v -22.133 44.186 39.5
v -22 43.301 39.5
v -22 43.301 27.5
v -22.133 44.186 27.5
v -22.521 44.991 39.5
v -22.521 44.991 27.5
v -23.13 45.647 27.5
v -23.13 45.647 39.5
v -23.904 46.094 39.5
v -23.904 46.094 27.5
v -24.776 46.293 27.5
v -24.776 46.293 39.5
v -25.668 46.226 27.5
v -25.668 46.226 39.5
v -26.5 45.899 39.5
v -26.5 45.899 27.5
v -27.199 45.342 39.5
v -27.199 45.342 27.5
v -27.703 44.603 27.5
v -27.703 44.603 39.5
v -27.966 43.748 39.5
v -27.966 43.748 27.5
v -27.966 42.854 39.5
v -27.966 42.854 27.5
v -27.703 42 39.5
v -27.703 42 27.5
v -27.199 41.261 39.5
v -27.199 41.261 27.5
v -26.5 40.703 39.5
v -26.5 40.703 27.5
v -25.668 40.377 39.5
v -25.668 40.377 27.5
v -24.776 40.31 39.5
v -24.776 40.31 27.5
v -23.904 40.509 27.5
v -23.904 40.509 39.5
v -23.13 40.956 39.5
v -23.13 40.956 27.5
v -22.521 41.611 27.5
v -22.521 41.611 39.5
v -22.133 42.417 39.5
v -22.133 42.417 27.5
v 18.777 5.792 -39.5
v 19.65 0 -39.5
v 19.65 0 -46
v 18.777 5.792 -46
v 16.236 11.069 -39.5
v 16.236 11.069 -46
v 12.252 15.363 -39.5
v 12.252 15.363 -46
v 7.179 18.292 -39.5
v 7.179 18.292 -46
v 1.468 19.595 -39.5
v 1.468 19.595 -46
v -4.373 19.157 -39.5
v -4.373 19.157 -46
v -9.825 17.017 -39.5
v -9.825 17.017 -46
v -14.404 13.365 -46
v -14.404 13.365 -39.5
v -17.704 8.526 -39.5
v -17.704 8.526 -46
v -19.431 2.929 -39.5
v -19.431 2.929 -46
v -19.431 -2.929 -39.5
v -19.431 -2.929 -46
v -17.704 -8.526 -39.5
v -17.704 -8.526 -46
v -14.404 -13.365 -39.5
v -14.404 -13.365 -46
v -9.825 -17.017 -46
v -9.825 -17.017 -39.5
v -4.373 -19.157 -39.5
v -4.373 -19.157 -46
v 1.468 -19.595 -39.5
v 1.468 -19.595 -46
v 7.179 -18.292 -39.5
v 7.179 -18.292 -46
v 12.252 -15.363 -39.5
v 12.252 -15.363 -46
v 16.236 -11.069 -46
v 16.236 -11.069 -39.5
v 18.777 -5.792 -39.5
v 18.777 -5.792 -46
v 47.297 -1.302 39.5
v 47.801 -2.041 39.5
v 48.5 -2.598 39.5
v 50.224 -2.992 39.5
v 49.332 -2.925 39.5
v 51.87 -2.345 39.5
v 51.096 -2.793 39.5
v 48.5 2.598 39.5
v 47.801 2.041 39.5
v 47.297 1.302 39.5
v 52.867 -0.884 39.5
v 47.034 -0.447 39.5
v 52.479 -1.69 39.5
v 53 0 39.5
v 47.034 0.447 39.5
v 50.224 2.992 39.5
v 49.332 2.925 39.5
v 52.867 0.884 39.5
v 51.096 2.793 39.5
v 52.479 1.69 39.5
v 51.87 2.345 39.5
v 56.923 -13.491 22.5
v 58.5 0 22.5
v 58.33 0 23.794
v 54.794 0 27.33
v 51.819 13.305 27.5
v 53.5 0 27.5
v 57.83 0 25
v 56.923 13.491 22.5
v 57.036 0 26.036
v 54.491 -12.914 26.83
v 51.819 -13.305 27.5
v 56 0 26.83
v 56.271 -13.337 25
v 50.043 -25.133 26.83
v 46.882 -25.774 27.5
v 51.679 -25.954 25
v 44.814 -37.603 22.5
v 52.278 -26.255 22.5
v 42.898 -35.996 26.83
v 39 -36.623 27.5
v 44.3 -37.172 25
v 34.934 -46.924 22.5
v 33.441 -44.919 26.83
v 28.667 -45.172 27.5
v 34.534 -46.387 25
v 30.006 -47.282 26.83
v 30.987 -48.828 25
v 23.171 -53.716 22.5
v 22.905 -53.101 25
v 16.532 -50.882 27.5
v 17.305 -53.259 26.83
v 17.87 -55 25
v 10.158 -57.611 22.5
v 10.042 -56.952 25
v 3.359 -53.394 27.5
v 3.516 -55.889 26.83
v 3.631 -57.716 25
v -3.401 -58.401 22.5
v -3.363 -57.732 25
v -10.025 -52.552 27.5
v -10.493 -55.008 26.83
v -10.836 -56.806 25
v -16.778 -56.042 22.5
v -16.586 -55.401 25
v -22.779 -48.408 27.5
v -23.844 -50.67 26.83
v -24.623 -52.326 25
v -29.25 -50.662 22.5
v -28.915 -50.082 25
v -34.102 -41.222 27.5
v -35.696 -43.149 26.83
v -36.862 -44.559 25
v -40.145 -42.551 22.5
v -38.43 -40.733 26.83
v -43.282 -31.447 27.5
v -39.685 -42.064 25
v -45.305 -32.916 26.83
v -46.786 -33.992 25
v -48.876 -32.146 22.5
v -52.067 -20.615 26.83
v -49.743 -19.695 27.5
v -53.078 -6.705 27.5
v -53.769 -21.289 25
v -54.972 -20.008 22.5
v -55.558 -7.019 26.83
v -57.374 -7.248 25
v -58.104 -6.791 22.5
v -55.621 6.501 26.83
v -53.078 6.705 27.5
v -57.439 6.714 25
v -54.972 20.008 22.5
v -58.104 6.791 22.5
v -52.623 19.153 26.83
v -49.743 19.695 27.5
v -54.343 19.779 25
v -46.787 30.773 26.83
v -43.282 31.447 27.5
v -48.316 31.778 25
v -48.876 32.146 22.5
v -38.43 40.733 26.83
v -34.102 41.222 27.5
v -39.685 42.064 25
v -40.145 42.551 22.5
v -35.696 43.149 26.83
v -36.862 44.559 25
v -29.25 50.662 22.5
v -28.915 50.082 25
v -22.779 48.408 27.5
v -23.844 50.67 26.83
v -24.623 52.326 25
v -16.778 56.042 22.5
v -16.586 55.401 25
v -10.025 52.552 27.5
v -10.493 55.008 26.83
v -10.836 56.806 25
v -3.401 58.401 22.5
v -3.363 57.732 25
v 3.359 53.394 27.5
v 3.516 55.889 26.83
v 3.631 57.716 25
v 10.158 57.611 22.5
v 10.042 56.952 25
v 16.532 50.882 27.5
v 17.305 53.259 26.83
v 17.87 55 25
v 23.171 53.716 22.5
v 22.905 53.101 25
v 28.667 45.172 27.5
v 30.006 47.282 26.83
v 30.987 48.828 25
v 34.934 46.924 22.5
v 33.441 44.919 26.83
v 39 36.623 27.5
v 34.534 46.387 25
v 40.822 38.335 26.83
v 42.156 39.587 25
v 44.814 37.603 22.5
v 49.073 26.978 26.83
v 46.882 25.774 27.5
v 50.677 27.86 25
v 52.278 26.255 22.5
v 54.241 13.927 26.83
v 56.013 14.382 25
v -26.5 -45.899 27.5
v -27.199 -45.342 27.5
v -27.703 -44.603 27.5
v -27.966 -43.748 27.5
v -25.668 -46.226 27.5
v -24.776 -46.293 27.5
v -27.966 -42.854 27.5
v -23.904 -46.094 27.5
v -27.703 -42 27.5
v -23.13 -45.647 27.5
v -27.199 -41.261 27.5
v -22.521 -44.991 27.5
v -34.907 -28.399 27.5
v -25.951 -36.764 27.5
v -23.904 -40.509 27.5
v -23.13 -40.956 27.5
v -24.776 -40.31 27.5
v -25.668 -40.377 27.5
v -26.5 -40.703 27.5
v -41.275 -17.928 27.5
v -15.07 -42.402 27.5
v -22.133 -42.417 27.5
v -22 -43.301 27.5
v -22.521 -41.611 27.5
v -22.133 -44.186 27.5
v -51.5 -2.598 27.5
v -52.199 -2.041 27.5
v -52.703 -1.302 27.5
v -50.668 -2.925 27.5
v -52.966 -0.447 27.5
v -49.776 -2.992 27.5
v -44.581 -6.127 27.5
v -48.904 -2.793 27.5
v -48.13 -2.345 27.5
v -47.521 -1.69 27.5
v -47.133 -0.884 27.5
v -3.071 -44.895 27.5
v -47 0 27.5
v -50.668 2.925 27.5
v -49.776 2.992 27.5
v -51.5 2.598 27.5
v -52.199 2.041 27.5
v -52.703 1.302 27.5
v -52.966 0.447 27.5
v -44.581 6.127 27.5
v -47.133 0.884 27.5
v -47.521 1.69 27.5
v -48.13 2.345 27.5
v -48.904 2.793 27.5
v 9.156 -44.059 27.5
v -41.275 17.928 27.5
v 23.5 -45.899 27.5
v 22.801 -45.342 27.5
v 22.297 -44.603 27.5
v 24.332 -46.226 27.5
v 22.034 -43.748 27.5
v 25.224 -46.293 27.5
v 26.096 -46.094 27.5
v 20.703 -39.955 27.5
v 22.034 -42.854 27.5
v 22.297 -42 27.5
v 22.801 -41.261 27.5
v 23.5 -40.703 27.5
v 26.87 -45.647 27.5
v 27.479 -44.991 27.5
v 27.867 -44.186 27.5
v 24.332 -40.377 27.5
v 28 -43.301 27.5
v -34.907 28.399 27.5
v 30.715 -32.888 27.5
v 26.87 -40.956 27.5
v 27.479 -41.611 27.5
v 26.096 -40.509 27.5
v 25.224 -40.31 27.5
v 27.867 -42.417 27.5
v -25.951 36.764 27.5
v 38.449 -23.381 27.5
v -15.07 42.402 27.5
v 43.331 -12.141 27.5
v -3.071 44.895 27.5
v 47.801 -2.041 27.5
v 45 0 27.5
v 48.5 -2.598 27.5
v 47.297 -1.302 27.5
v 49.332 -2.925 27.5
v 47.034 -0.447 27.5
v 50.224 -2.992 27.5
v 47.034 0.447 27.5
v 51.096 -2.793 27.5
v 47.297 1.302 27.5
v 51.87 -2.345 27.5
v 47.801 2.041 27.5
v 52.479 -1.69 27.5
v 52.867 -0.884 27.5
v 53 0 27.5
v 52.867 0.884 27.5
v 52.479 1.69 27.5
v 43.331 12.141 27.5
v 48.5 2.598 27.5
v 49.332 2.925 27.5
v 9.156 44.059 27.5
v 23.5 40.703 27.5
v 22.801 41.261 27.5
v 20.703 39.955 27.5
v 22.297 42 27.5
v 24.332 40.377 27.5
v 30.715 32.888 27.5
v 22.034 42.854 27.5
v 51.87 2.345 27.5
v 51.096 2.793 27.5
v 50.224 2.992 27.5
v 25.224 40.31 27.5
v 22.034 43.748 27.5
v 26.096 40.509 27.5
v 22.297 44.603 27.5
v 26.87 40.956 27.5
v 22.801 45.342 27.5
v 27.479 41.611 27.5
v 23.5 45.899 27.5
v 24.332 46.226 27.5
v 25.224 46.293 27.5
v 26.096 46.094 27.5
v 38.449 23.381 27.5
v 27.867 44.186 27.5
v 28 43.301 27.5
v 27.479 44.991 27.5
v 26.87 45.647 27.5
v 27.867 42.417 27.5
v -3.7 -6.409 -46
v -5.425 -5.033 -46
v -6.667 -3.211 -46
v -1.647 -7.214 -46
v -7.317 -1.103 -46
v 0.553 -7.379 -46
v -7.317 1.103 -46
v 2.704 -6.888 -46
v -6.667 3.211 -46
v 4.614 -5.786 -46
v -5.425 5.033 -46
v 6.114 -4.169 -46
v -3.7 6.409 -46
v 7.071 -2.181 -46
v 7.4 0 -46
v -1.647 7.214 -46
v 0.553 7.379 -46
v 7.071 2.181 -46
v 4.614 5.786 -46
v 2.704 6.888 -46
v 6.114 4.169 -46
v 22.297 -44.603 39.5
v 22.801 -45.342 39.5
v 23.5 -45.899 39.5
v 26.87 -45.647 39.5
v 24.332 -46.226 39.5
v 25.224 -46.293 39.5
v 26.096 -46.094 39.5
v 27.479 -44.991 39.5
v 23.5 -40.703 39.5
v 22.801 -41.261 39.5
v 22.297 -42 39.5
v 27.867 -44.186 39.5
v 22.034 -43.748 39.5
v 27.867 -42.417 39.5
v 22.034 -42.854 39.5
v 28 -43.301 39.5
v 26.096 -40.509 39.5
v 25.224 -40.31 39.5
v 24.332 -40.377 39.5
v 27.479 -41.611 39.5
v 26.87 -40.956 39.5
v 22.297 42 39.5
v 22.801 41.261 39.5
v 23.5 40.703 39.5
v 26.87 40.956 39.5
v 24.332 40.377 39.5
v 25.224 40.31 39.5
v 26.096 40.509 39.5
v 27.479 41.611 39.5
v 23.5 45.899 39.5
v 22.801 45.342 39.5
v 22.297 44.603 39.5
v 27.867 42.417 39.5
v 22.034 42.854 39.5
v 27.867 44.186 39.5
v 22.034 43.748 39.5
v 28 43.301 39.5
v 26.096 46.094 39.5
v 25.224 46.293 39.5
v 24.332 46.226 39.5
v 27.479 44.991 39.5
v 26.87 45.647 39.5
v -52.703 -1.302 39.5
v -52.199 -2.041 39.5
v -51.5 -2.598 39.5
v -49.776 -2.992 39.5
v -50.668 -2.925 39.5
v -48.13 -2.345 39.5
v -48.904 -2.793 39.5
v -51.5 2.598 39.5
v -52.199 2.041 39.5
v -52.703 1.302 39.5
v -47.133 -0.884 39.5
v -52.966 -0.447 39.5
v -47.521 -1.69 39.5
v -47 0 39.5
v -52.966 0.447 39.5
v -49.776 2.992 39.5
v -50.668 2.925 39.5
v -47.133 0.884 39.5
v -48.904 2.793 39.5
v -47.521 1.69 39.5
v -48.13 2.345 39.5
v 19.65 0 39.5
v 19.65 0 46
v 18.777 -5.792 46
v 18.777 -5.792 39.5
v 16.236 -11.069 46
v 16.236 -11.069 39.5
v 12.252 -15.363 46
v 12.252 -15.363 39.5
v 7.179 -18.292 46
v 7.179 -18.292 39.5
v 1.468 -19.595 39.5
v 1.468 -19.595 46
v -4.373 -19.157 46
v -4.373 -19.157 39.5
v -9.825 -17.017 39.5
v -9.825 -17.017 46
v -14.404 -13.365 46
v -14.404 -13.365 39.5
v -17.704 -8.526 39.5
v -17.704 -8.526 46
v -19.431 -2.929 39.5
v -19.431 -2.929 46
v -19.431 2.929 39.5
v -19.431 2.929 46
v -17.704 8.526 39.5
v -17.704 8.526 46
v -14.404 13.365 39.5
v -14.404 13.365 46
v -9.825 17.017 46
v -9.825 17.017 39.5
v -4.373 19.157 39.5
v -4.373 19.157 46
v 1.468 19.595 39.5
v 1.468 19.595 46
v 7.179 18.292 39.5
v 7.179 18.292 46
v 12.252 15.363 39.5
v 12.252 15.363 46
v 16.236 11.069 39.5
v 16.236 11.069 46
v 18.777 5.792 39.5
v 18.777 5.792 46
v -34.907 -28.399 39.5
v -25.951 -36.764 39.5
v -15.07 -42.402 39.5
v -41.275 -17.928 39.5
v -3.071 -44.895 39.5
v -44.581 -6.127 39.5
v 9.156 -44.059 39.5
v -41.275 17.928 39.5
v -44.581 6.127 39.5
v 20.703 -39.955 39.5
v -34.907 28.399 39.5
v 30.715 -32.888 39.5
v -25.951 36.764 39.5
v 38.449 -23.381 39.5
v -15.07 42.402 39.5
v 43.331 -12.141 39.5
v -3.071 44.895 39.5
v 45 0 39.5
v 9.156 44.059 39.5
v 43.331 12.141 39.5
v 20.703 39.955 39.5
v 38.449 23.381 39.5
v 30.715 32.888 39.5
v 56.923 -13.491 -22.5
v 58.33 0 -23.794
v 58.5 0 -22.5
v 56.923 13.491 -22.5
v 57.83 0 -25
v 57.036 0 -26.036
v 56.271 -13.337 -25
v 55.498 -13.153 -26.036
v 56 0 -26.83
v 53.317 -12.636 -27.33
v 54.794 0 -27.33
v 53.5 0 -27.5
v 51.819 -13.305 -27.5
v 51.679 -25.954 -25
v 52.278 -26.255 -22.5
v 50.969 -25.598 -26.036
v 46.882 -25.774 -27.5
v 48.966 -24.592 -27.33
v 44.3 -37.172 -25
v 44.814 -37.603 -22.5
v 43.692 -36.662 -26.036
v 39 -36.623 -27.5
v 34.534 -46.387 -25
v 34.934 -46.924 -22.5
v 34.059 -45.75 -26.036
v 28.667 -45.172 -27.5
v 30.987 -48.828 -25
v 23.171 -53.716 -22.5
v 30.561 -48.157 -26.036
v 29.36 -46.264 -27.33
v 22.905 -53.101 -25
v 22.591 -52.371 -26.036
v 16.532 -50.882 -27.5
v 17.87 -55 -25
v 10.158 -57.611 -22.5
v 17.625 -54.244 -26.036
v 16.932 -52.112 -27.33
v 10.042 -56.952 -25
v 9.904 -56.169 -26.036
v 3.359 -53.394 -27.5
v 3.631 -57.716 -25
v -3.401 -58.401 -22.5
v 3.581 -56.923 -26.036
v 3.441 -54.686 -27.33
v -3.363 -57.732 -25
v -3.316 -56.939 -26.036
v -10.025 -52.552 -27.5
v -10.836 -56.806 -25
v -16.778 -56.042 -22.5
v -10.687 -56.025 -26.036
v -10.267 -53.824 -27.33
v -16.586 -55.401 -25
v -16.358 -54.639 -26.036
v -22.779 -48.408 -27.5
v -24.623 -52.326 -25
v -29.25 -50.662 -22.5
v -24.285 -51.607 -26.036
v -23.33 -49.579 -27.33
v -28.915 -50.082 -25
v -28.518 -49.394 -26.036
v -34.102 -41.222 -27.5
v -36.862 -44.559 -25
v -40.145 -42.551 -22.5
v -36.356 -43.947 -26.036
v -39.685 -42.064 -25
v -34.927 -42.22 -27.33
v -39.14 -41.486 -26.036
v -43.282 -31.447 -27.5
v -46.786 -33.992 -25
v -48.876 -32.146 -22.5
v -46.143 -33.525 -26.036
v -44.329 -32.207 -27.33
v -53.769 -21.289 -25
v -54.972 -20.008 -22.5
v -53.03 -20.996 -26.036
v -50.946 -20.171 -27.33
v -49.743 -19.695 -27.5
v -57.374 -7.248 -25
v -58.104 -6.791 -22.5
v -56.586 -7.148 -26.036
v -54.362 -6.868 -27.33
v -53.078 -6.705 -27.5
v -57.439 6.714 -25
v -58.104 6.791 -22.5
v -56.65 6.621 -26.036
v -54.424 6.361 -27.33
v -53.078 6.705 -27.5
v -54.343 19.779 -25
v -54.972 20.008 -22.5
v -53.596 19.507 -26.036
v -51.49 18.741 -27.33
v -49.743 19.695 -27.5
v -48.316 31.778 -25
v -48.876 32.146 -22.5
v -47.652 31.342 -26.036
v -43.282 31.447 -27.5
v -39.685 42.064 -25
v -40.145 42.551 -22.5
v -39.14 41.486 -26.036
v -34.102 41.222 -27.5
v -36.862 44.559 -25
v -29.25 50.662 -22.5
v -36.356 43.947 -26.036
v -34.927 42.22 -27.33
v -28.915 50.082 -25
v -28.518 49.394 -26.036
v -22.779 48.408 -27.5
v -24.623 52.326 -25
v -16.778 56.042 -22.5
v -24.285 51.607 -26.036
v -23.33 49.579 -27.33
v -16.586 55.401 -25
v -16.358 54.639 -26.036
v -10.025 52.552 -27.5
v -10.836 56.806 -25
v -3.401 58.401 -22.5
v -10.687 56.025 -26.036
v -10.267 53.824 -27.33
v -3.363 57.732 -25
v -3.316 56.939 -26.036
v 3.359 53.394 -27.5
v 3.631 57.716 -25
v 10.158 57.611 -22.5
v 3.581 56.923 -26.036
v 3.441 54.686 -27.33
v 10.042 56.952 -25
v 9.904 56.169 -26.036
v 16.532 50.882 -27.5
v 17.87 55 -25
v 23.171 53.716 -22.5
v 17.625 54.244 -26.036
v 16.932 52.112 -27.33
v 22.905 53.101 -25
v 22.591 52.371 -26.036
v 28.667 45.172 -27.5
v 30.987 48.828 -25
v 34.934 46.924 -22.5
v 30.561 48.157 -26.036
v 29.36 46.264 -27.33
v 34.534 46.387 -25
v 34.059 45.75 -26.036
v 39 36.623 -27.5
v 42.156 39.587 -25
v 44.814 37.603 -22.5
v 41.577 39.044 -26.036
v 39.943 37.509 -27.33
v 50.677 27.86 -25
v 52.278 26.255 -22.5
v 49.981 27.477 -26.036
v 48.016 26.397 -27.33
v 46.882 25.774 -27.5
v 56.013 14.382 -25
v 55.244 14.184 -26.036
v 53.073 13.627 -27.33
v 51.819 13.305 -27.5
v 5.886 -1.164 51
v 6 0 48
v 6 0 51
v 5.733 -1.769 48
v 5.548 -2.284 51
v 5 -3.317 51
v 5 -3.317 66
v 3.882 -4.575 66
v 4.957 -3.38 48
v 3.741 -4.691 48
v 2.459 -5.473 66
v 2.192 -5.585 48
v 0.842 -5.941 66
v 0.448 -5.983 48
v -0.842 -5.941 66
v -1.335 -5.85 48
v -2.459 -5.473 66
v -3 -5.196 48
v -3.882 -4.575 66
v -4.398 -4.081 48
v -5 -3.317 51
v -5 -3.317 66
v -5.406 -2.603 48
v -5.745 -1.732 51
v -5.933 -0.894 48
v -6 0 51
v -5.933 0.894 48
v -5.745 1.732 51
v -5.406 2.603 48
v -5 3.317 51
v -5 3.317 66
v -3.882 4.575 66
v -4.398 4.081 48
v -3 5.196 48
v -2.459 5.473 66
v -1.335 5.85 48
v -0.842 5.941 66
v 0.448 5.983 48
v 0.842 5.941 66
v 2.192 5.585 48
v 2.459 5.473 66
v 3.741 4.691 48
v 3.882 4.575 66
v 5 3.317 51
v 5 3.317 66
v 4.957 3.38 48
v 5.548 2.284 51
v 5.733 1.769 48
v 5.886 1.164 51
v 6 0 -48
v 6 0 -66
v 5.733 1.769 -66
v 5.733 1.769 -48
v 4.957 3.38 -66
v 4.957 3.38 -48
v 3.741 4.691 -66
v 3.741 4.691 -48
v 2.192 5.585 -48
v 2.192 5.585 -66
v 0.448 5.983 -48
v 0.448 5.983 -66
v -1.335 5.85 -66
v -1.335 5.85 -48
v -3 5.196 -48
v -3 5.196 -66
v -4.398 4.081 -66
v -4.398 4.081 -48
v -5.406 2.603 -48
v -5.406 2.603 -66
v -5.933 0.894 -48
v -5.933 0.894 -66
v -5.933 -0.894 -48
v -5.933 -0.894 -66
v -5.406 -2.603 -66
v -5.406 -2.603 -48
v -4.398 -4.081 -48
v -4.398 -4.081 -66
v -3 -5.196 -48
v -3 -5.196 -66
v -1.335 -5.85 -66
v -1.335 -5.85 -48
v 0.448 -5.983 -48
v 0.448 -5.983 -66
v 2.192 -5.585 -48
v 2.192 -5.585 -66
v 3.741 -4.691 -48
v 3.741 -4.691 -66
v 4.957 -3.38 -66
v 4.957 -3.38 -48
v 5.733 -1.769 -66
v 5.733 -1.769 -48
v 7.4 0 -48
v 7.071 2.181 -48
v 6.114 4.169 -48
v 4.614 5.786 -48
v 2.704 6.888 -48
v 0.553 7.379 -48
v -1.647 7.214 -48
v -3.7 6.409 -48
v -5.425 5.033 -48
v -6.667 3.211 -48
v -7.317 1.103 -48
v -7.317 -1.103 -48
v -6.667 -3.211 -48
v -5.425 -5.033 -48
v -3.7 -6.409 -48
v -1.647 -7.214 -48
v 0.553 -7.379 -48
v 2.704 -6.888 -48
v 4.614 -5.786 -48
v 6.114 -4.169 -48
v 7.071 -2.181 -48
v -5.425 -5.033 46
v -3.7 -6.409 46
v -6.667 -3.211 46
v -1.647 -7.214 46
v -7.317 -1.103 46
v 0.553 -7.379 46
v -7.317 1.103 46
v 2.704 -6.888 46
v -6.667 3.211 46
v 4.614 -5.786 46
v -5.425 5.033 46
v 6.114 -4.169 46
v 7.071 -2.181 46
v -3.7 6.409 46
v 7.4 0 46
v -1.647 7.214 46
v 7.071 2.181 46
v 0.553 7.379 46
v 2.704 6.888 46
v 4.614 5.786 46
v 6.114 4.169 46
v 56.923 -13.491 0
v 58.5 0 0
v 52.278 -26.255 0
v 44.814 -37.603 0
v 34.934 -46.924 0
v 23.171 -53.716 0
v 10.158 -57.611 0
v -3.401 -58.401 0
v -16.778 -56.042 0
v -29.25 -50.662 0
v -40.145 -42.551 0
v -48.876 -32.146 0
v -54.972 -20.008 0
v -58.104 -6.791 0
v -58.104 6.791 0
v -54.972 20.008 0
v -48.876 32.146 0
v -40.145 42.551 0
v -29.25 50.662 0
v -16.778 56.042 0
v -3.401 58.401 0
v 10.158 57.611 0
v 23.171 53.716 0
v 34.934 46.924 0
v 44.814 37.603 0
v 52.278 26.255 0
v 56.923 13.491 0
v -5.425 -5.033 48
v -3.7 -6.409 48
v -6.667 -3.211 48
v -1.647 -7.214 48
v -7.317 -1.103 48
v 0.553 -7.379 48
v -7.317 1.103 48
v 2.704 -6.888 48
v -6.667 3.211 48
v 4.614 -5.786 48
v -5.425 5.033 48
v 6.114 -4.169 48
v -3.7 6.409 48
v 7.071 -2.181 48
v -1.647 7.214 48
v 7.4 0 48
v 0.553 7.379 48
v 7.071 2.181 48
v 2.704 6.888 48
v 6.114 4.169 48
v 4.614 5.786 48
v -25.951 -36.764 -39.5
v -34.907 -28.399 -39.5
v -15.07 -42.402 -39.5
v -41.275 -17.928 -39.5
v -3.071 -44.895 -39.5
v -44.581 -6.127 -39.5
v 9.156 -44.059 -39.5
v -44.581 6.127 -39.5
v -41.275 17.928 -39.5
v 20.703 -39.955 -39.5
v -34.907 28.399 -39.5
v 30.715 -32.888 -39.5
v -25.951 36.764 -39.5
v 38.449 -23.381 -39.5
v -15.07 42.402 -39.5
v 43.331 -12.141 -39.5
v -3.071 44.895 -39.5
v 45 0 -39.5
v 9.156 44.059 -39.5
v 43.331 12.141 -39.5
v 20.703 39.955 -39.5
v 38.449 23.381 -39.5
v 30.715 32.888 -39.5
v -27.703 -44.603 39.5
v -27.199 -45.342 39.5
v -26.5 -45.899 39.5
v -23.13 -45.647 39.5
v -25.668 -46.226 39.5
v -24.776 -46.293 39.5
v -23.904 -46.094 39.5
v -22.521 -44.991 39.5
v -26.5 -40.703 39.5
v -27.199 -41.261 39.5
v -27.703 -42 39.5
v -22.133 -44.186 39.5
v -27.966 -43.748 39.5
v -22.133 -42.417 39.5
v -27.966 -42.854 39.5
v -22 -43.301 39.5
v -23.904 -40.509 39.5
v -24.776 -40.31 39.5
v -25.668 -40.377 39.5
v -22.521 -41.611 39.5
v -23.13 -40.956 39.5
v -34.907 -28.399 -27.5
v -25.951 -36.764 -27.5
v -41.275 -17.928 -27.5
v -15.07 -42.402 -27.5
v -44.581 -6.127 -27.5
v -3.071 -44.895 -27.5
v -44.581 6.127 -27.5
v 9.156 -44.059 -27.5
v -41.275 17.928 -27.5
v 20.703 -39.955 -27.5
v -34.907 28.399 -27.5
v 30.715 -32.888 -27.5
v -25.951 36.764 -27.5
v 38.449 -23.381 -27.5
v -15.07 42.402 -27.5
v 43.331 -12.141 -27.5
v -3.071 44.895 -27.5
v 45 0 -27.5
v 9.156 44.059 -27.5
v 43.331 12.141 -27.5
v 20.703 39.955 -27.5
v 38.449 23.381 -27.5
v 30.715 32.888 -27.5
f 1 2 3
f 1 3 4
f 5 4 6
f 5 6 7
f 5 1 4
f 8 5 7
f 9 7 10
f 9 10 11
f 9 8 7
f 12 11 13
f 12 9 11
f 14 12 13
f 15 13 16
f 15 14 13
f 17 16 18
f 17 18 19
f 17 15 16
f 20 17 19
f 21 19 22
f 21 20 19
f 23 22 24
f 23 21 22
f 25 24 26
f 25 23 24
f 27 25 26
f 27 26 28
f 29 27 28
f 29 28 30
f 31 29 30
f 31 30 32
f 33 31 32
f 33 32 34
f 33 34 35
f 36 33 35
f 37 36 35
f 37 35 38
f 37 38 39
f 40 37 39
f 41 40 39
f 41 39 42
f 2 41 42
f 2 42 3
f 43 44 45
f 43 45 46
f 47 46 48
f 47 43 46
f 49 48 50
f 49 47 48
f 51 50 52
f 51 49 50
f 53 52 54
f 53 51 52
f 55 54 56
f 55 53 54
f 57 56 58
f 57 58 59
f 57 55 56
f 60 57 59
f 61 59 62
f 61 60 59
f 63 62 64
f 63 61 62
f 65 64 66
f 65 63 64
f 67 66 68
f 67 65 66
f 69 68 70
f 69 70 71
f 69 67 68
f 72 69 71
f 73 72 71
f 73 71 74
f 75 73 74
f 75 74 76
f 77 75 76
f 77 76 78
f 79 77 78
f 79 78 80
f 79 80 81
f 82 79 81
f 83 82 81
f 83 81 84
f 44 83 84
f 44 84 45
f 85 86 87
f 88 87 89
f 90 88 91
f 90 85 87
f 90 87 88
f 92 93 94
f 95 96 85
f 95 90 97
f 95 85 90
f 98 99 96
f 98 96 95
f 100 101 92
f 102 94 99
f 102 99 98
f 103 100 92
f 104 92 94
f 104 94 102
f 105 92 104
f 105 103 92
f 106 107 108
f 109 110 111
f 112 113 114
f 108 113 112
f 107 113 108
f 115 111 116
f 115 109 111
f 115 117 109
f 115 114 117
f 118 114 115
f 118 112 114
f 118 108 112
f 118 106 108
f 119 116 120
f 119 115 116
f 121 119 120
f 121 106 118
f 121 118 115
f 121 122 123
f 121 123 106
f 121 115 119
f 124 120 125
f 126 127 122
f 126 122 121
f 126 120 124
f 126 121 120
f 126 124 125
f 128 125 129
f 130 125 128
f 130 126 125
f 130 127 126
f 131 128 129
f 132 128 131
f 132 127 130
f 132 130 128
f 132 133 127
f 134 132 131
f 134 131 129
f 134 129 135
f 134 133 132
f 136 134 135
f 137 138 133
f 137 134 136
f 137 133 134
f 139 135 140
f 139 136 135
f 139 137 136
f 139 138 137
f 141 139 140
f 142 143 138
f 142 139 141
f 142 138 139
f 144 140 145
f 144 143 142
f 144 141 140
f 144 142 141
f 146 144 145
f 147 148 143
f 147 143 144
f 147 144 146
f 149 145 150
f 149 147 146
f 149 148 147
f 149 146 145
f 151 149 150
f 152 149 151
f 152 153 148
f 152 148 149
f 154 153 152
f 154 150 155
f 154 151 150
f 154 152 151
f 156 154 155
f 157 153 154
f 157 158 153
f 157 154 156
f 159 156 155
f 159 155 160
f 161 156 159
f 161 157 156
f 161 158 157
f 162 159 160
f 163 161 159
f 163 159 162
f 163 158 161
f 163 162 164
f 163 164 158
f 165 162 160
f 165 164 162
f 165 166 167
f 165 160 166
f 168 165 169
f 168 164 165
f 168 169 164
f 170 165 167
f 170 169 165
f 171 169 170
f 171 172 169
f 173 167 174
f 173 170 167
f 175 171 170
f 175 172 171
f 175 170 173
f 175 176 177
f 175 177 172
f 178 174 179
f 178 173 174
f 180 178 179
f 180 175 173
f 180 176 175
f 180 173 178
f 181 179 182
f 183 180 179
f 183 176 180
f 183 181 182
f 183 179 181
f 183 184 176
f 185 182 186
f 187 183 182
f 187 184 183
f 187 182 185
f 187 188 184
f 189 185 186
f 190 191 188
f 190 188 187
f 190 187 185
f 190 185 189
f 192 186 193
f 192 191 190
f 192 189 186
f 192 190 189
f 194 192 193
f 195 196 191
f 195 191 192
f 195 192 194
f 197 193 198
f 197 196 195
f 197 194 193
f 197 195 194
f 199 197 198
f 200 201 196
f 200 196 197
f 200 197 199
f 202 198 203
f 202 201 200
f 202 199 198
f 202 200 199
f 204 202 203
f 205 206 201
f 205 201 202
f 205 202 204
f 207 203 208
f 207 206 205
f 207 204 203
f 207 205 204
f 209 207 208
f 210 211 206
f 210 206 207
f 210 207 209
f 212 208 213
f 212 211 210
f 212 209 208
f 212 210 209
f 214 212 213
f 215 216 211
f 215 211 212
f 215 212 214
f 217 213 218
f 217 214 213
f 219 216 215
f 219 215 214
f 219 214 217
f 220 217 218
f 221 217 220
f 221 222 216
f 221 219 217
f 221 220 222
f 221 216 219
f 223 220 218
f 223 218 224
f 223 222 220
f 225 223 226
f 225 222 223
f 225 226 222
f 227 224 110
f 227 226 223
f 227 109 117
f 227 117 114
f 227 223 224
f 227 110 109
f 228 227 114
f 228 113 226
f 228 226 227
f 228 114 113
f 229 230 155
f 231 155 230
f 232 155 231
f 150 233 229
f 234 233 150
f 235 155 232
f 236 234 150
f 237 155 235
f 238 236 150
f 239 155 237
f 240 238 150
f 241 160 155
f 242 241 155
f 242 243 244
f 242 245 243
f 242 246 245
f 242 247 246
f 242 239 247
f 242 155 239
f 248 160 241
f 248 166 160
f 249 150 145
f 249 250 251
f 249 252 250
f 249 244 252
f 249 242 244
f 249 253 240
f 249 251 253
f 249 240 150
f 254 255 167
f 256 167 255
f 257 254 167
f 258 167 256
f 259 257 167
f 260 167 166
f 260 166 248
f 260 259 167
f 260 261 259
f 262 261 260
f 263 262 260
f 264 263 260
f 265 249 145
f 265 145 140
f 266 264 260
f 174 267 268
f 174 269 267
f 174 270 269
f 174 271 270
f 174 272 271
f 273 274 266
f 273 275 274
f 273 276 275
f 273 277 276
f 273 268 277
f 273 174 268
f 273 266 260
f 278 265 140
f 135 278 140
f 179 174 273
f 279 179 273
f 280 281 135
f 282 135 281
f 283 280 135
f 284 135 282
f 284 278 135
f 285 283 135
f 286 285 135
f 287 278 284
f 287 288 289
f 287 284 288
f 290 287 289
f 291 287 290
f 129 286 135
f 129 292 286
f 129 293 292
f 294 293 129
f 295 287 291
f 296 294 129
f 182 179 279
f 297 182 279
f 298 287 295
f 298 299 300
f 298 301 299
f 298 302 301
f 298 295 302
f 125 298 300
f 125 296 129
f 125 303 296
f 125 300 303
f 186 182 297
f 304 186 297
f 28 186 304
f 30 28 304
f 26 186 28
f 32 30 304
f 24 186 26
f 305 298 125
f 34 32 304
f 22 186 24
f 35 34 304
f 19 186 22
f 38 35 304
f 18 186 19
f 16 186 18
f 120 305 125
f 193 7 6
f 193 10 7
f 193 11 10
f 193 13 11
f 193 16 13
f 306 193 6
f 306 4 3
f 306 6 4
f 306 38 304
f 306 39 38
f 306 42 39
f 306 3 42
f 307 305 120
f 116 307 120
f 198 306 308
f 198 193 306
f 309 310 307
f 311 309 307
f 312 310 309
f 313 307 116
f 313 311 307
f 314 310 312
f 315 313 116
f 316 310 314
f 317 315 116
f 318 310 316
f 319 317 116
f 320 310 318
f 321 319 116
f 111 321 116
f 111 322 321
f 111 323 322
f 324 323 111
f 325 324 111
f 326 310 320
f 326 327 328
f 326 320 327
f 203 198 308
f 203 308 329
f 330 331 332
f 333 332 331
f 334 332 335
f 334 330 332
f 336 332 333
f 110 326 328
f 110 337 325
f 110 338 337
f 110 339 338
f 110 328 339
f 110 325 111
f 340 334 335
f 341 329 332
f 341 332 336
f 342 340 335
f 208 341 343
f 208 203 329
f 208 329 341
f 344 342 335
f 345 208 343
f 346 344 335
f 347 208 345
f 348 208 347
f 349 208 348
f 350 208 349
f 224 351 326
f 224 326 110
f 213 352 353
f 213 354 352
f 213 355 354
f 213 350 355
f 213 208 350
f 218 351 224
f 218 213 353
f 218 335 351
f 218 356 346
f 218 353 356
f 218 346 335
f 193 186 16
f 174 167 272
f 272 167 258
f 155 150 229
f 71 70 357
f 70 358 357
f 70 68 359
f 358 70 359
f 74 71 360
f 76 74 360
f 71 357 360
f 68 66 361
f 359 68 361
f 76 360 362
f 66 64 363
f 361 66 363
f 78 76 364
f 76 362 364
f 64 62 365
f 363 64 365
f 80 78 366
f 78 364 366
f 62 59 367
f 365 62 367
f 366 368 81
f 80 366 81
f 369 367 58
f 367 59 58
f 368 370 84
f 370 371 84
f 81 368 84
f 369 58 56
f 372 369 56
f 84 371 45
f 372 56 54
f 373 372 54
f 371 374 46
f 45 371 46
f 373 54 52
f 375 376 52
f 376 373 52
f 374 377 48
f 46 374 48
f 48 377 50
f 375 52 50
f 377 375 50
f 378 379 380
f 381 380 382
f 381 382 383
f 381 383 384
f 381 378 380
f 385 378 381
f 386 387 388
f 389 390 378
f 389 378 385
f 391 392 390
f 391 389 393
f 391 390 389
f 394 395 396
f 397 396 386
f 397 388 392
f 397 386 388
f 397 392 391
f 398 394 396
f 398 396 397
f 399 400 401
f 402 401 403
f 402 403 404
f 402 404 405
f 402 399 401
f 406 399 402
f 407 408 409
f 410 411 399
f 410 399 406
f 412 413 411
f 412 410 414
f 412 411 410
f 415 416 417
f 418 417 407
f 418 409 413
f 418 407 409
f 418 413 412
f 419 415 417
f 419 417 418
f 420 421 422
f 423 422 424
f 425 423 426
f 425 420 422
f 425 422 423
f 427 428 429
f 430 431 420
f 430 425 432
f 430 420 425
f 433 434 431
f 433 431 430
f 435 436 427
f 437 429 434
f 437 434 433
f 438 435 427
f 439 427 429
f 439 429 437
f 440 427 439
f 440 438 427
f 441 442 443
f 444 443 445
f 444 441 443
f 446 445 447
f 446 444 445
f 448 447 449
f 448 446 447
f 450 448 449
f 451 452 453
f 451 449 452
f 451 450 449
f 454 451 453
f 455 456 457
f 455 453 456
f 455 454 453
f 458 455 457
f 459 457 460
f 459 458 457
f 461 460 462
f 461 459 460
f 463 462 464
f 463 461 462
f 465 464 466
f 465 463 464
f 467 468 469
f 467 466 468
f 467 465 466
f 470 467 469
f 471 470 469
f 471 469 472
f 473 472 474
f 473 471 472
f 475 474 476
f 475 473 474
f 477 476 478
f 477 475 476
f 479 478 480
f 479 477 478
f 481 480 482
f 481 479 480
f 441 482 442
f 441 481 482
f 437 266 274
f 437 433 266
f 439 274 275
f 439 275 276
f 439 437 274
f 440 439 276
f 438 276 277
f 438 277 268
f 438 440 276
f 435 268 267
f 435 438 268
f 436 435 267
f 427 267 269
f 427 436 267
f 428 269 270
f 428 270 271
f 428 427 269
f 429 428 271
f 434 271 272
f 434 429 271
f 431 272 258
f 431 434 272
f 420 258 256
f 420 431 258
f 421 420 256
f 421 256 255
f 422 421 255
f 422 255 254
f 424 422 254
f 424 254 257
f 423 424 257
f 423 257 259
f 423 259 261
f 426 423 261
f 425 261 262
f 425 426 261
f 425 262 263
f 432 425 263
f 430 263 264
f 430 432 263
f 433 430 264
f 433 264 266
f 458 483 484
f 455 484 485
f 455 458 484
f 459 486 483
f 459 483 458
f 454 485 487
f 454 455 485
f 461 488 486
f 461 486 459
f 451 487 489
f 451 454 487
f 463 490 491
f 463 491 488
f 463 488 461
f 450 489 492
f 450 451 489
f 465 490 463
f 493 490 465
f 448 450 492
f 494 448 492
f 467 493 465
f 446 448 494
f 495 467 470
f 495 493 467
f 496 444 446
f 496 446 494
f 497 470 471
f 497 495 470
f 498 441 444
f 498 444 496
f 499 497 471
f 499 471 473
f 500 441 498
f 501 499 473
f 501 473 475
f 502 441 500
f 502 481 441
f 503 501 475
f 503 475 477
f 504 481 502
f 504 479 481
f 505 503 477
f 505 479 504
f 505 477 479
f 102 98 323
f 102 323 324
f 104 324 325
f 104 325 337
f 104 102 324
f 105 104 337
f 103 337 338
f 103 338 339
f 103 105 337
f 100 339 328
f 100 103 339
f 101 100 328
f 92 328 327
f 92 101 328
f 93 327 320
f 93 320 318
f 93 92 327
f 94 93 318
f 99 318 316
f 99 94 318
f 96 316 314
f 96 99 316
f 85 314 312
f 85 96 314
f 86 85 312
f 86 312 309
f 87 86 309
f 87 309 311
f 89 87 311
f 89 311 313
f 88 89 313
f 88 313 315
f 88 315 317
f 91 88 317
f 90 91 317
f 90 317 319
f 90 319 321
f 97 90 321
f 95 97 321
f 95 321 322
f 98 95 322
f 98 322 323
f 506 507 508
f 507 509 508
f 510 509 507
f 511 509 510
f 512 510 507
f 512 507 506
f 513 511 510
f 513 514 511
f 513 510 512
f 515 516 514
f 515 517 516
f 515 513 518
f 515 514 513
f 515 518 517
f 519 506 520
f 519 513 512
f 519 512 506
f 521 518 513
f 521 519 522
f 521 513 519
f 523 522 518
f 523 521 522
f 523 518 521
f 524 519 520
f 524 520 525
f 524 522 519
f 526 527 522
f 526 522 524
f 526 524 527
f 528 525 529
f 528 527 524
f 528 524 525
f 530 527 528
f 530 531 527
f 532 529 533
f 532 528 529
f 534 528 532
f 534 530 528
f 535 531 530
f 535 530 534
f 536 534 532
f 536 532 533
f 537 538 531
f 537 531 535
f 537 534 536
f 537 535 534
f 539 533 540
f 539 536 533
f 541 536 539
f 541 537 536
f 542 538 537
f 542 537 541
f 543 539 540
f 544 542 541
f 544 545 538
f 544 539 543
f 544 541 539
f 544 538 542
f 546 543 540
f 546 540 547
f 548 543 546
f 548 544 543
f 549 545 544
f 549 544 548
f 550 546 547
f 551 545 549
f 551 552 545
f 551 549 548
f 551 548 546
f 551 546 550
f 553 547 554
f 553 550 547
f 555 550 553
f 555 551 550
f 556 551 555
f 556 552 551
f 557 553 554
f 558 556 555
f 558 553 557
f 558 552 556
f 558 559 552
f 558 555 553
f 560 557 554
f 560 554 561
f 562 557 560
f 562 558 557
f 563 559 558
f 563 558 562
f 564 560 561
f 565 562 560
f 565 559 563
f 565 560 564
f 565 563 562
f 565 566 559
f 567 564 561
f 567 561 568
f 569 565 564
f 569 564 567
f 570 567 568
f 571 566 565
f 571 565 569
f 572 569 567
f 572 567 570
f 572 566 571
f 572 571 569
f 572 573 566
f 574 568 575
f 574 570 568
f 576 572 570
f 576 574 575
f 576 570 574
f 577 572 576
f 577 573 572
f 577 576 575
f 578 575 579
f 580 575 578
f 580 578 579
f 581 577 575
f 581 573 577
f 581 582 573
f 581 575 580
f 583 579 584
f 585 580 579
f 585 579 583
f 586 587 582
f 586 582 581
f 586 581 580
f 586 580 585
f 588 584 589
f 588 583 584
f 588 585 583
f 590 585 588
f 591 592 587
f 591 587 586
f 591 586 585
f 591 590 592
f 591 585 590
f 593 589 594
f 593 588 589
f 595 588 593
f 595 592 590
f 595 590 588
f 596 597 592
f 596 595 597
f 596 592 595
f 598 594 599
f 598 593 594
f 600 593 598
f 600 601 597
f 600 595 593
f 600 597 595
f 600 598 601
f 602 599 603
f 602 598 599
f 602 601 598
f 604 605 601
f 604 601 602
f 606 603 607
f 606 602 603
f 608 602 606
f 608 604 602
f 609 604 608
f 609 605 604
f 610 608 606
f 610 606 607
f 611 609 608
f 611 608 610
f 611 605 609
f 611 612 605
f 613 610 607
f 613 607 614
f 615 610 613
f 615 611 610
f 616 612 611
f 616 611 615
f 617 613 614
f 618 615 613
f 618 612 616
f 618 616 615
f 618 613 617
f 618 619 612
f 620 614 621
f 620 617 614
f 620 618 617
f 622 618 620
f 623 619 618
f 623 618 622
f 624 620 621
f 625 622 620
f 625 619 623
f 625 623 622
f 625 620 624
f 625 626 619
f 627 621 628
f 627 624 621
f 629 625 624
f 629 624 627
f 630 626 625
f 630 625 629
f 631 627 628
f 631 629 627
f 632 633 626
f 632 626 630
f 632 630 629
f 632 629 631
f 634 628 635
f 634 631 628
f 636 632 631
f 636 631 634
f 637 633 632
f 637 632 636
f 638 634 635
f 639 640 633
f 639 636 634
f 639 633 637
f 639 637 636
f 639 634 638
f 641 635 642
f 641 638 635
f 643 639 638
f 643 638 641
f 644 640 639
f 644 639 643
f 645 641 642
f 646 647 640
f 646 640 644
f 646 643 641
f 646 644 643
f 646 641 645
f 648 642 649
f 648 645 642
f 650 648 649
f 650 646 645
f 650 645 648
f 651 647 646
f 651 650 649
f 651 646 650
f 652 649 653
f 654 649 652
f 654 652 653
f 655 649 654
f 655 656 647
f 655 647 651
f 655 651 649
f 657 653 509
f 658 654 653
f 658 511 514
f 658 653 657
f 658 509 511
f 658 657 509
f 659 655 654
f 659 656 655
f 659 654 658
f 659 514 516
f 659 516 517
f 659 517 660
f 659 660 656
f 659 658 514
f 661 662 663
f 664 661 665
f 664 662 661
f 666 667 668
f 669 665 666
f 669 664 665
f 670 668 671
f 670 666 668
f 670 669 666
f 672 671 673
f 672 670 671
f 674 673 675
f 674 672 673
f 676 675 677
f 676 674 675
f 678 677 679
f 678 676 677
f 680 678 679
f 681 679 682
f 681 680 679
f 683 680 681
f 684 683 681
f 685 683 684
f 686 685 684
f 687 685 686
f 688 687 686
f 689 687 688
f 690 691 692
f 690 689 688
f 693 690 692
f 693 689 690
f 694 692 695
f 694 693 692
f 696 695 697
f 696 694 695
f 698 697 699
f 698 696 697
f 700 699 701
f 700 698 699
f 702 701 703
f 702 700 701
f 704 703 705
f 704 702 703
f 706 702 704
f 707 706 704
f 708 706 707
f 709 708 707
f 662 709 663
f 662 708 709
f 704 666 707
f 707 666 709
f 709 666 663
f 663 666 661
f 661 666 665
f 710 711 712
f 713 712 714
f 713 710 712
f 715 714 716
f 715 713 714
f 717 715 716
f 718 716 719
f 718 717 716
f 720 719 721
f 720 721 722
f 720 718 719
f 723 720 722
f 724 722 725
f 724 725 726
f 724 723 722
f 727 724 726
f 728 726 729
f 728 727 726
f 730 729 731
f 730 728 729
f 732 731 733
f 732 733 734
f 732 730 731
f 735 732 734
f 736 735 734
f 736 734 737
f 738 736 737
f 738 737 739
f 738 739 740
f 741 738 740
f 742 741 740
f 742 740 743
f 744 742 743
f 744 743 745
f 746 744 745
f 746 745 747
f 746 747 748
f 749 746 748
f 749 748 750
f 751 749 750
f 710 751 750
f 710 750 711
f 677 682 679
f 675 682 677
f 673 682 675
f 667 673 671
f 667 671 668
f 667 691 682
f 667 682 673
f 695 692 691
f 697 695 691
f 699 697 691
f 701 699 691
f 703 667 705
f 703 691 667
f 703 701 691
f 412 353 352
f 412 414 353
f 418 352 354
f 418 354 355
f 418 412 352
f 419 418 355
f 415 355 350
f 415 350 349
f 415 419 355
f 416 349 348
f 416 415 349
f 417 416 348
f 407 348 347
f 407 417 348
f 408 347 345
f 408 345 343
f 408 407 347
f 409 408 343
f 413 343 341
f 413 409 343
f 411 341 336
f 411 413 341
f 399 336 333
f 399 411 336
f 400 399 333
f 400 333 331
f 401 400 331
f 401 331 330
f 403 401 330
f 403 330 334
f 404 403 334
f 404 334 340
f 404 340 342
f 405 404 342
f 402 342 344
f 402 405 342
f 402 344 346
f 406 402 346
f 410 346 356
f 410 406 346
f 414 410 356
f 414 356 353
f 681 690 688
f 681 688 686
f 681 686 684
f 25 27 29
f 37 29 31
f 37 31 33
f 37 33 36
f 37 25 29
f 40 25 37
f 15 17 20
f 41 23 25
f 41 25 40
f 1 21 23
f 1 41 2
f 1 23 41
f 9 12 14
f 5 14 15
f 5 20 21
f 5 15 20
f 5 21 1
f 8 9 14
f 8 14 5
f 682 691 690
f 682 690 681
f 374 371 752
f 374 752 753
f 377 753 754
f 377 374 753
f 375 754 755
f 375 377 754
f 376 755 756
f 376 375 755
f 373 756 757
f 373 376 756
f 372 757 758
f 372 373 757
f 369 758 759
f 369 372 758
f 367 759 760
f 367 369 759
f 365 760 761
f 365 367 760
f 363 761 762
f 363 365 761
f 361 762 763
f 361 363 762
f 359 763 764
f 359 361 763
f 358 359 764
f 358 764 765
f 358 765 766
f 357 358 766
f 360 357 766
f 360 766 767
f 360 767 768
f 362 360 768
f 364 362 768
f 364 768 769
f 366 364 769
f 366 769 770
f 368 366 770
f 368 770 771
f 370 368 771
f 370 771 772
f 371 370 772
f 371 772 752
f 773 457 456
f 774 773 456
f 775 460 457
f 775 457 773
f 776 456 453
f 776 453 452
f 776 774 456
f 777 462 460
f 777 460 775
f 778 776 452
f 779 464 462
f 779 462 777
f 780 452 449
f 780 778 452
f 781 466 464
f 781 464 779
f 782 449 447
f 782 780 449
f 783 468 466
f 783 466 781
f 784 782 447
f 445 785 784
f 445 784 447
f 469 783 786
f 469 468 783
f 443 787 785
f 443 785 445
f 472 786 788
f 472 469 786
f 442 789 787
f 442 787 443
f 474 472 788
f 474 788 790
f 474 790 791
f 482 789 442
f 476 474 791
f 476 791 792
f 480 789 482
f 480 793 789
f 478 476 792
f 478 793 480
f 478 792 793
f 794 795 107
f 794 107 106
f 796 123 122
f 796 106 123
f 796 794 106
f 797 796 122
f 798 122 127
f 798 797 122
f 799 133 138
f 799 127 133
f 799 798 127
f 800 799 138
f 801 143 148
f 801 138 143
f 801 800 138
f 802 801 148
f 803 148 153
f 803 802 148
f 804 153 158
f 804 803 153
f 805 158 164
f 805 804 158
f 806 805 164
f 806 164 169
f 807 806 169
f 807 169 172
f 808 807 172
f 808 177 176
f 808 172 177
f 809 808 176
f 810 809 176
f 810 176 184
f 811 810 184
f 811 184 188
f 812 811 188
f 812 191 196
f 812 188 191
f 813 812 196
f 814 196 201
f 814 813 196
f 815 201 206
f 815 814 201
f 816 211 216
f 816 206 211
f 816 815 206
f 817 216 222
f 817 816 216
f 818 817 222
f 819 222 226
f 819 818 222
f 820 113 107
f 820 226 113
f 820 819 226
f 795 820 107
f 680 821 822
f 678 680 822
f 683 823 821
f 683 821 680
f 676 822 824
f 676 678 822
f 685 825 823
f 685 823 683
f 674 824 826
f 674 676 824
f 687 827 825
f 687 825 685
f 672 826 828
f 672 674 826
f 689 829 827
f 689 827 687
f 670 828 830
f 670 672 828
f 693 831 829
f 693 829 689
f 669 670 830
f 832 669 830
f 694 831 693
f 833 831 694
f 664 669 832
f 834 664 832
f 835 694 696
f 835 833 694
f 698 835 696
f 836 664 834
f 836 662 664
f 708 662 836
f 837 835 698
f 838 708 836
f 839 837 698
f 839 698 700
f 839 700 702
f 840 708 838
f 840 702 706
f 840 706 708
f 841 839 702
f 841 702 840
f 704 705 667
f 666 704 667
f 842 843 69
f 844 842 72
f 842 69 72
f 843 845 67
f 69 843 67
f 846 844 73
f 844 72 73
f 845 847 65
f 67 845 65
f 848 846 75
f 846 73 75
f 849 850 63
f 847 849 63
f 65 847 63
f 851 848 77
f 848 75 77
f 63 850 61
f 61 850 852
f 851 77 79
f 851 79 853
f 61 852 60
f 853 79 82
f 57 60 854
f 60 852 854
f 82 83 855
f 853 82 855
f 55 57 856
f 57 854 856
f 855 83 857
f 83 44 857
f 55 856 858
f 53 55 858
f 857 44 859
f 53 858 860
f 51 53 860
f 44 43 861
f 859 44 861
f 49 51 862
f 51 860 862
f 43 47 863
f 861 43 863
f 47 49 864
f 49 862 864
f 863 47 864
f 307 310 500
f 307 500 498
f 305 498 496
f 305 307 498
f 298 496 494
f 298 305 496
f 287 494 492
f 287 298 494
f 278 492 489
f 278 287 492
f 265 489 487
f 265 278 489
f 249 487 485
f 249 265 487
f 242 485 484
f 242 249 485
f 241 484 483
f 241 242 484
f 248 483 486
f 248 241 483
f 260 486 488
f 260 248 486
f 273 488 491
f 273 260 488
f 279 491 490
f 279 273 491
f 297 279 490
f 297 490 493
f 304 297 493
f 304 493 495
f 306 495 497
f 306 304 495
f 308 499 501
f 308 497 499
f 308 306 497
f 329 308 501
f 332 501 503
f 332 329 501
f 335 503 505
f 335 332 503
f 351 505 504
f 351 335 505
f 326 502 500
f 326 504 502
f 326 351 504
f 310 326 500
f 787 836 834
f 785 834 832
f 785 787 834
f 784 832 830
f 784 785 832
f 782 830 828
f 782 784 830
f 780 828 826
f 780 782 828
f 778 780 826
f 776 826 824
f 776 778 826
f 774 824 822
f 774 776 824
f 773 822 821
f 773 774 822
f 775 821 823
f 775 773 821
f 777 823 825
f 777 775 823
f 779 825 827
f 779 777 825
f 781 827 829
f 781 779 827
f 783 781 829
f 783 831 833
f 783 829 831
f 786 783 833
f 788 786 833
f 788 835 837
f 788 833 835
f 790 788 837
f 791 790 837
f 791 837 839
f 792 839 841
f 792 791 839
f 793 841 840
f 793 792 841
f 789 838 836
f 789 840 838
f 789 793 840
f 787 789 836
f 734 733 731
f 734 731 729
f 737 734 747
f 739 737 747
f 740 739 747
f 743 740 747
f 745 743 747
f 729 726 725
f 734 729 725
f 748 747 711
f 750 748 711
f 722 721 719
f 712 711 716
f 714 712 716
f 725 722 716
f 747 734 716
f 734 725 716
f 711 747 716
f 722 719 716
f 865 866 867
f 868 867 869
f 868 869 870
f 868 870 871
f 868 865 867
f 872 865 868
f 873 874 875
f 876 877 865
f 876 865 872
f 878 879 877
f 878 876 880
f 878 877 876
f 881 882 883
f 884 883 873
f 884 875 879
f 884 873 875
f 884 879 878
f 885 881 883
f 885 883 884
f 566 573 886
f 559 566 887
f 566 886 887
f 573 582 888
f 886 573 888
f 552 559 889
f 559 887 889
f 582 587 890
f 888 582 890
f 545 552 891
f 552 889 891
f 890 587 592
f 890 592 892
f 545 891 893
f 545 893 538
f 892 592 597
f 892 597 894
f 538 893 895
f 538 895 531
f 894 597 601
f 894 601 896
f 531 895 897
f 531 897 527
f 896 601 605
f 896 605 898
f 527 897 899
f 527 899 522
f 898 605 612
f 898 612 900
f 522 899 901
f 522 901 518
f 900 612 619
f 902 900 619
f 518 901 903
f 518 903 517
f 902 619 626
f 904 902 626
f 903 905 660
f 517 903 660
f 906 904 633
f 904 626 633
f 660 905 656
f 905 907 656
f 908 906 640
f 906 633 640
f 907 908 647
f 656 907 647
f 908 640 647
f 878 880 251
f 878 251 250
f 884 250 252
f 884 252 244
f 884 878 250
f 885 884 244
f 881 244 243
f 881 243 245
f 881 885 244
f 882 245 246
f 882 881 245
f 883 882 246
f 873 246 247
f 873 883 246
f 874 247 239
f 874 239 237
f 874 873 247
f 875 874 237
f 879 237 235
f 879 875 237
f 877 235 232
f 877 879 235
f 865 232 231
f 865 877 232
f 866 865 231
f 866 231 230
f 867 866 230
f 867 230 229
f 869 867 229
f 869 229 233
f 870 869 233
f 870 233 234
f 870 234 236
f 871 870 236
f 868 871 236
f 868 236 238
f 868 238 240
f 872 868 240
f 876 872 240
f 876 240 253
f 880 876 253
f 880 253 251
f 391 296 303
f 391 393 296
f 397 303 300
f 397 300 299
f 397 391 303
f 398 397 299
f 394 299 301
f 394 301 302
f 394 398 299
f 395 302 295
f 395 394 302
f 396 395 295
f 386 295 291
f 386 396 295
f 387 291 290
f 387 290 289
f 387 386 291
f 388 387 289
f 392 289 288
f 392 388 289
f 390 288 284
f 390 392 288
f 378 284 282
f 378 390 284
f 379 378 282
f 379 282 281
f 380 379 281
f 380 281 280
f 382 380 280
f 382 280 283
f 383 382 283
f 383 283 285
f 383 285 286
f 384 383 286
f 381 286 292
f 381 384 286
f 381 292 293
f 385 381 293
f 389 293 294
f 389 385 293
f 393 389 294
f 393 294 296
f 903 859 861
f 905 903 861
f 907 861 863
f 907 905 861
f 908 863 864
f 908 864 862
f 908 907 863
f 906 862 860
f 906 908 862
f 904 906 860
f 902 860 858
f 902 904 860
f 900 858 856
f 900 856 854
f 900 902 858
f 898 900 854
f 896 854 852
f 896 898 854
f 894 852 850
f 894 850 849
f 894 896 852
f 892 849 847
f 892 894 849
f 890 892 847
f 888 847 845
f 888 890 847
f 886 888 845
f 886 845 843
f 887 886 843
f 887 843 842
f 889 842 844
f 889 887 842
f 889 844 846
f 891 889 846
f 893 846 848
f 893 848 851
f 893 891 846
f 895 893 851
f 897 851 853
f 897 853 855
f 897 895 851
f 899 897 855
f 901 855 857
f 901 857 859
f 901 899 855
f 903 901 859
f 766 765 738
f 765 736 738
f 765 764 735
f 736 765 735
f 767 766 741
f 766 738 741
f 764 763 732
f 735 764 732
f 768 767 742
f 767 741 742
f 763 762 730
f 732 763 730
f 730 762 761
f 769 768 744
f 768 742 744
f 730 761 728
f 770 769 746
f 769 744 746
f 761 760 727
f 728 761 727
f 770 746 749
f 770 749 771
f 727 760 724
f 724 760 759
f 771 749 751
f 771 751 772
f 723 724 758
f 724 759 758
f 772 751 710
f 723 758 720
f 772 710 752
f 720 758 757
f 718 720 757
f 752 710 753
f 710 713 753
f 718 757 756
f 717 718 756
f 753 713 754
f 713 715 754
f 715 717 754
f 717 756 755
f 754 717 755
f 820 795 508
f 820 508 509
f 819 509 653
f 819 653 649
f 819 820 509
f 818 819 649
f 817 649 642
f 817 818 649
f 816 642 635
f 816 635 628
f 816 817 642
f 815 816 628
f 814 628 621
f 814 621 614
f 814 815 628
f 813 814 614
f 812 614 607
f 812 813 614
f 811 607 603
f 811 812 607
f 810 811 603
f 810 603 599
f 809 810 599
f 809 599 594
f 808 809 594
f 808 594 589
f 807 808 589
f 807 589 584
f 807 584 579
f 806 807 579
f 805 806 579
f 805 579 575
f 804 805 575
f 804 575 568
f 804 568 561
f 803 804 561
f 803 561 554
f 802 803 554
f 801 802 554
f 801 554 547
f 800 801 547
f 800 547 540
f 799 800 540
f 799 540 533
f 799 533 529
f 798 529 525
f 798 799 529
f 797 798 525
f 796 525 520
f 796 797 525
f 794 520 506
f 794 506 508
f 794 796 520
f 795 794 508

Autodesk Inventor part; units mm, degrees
ref_plane "YZ Plane" through (0, 0, 0) normal (1, 0, 0) x (0, 1, 0)
ref_plane "XZ Plane" through (0, 0, 0) normal (0, 1, 0) x (-1, 0, 0)
ref_plane "XY Plane" through (0, 0, 0) normal (0, 0, 1) x (1, 0, 0)
sketch "スケッチ1" plane through (0, 0, 0) normal (0, 0, 1) x (1, 0, 0)
  circle A0 centre (0, 0) radius 6
  dimension "d0" = 12
extrude "押し出し1" add sketch "スケッチ1" along normal mid plane 132
sketch "スケッチ2" plane through (0, 0, 0) normal (0, 0, 1) x (1, 0, 0)
  circle A0 centre (0, 0) radius 6 construction
  circle A1 centre (0, 0) radius 7.4
  dimension "d3" = 14.8
extrude "押し出し2" add sketch "スケッチ2" along normal mid plane 96
sketch "スケッチ3" plane through (0, 0, 0) normal (0, 0, 1) x (1, 0, 0)
  circle A0 centre (0, 0) radius 6 projected
  circle A1 centre (0, 0) radius 19.65
  dimension "d6" = 39.3
extrude "押し出し3" add sketch "スケッチ3" along normal mid plane 92
sketch "スケッチ4" plane through (0, 0, 0) normal (0, 0, 1) x (1, 0, 0)
  circle A0 centre (0, 0) radius 45
  dimension "d9" = 90
extrude "押し出し4" add sketch "スケッチ4" along normal mid plane 79
sketch "スケッチ5" plane through (0, 0, 0) normal (0, 0, 1) x (1, 0, 0)
  circle A0 centre (0, 0) radius 58.5
  dimension "d12" = 117
extrude "押し出し5" add sketch "スケッチ5" along normal mid plane 55
fillet "フィレット1" radius 5 2 edges at (-58.5, 0, 27.5) (-58.5, 0, -27.5)
sketch "スケッチ6" plane through (0, 0, 39.5) normal (0, 0, 1) x (1, 0, 0)
  circle A0 centre (0, 0) radius 50 construction
  circle A1 centre (50, 0) radius 3
  circle A2 centre (25, 43.3013) radius 3
  circle A3 centre (-25, 43.3013) radius 3
  circle A4 centre (-50, 0) radius 3
  circle A5 centre (-25, -43.3013) radius 3
  circle A6 centre (25, -43.3013) radius 3
  dimension "d16" = 100
  dimension "d17" = 6
  dimension "d20" = 360
extrude "押し出し6" add sketch "スケッチ6" against normal up to surface (12 mm away)
sketch "スケッチ7" plane through (0, 0, 66) normal (0, 0, 1) x (1, 0, 0)
  circle A0 centre (0, 0) radius 6 projected
  line L0 (-5, 3.3166) -> (-5, -3.3166)
  circle A1 centre (0, 0) radius 6 projected
  line L1 (5, 3.3166) -> (5, -3.3166)
  dimension "d24" = 5
  dimension "d25" = 5
extrude "押し出し7" cut sketch "スケッチ7" against normal blind 15 contours A0 L1 | L0 A0
properties part number "movero"
